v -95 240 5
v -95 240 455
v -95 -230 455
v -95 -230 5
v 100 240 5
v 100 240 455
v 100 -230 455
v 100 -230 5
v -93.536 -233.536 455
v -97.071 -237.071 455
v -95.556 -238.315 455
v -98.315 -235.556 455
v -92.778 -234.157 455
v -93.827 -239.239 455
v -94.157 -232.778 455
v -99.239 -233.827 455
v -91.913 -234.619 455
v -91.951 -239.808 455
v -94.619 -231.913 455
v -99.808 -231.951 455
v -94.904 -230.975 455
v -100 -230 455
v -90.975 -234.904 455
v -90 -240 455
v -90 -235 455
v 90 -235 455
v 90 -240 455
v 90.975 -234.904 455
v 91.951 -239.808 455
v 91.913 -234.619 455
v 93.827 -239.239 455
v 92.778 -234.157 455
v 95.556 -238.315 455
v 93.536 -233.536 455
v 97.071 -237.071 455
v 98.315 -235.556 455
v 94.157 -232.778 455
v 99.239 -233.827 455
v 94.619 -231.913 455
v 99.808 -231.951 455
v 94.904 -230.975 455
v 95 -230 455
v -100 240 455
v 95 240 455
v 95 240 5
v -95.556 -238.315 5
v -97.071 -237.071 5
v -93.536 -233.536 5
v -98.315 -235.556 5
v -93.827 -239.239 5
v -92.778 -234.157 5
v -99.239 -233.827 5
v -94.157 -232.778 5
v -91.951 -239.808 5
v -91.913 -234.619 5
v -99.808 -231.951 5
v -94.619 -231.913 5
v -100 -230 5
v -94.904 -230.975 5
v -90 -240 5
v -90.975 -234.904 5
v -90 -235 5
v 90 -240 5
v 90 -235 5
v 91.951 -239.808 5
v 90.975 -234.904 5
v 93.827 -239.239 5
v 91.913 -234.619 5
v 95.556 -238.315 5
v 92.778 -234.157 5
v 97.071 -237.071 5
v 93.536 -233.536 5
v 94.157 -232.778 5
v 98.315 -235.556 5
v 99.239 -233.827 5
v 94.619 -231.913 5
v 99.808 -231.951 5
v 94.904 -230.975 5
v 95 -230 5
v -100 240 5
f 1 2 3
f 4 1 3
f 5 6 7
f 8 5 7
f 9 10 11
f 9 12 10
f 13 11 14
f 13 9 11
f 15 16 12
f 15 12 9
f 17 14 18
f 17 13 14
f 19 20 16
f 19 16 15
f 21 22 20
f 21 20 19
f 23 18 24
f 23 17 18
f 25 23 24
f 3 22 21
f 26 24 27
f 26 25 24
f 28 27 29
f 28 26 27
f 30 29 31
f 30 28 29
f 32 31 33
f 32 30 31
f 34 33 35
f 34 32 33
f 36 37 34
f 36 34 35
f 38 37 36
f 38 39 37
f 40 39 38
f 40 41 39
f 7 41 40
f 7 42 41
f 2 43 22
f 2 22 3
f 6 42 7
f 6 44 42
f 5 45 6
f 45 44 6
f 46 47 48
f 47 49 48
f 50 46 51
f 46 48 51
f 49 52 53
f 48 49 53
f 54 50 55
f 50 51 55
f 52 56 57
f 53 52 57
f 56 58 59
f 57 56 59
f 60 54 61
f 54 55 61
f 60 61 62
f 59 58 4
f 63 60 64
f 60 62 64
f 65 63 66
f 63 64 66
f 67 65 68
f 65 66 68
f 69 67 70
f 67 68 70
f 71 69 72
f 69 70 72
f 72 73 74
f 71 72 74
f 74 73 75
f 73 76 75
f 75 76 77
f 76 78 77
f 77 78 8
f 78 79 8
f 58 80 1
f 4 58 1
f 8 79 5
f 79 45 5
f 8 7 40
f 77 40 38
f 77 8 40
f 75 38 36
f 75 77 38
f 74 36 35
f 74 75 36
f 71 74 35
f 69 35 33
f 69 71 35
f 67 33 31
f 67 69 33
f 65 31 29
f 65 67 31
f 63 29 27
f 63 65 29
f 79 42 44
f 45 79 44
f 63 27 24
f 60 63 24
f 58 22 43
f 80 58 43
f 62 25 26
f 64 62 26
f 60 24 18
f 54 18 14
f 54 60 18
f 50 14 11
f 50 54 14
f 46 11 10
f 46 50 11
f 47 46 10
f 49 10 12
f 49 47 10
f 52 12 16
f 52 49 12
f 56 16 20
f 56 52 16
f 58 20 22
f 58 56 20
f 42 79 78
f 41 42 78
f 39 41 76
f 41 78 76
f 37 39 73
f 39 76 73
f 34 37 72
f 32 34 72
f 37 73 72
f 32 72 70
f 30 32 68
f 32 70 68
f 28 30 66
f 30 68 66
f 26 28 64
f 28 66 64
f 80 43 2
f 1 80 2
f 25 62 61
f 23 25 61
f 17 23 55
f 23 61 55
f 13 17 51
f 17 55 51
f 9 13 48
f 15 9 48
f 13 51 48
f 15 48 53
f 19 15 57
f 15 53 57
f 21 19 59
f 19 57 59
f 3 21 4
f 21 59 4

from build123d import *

# Parameters (mm, degrees)
SKETCH_1_W            = 200
SKETCH_1_H            = 480
EXTRUDE_1_DEPTH       = 5
FILLET_1_R            = 5
EXTRUDE_START         = 450
EXTRUDE_3_DEPTH       = 450
CUT_EXTRUDE_START     = -5
CUT_EXTRUDE_2_DEPTH   = 5
SHEET_START           = 5
SHEET_METAL_3_DEPTH   = 450
SHEET_METAL_3_2_DEPTH = 450


# Read off the part's stored shape, not the designer's step: 转换实体3
with BuildPart() as part:
    # 草图1 → 凸台-拉伸1 (new body)
    with BuildSketch(Plane.XY):
        Rectangle(SKETCH_1_W, SKETCH_1_H)
    extrude(amount=EXTRUDE_1_DEPTH)

    # 圆角1
    fillet_1_edges = [part.edges().sort_by_distance(p)[0] for p in [
        (100, -240, 2.5),
        (-100, -240, 2.5),
    ]]
    fillet(fillet_1_edges, radius=FILLET_1_R)

    # 草图4 → 凸台-拉伸3 (add)
    with BuildSketch(Plane.XY.offset(5).offset(EXTRUDE_START)):
        with BuildLine():
            Line((-95, 240), (-95, -235))
            Line((-95, -235), (95, -235))
            Line((95, -235), (95, 240))
            Line((95, 240), (100, 240))
            Line((100, 240), (100, -235))
            ThreePointArc((100, -235), (98.535533906, -238.535533906), (95, -240))
            Line((95, -240), (-95, -240))
            ThreePointArc((-95, -240), (-98.535533906, -238.535533906), (-100, -235))
            Line((-100, -235), (-100, 240))
            Line((-100, 240), (-95, 240))
        make_face()
    extrude(amount=-EXTRUDE_3_DEPTH)

    # Sketch 5 → 切除-拉伸2 (cut)
    with BuildSketch(Plane(origin=(0, 0, 0), x_dir=(-1, 0, 0), z_dir=(0, 0, -1)).offset(CUT_EXTRUDE_START)):
        with BuildLine():
            Line((-95, -240), (95, -240))
            ThreePointArc((95, -240), (98.535533906, -238.535533906), (100, -235))
            Line((100, -235), (100, 240))
            Line((100, 240), (-100, 240))
            Line((-100, 240), (-100, -235))
            ThreePointArc((-100, -235), (-98.535533906, -238.535533906), (-95, -240))
        make_face()
    extrude(amount=CUT_EXTRUDE_2_DEPTH, mode=Mode.SUBTRACT)

    # Sheet Metal 3 outline → Sheet Metal 3 (cut)
    with BuildSketch(Plane.XY.offset(SHEET_START)):
        with BuildLine():
            Line((-95, -240), (-90, -240))
            ThreePointArc((-90, -240), (-97.071067812, -237.071067812), (-100, -230))
            Line((-100, -230), (-100, -235))
            ThreePointArc((-100, -235), (-98.535533906, -238.535533906), (-95, -240))
        make_face()
        with BuildLine():
            ThreePointArc((100, -230), (97.071067812, -237.071067812), (90, -240))
            Line((90, -240), (95, -240))
            ThreePointArc((95, -240), (98.535533906, -238.535533906), (100, -235))
            Line((100, -235), (100, -230))
        make_face()
    extrude(amount=SHEET_METAL_3_DEPTH, mode=Mode.SUBTRACT)

    # Sheet Metal 3 2 outline → Sheet Metal 3 2 (add)
    with BuildSketch(Plane.XY.offset(SHEET_START)):
        with BuildLine():
            Line((-95, -235), (-90, -235))
            ThreePointArc((-90, -235), (-93.535533906, -233.535533906), (-95, -230))
            Line((-95, -230), (-95, -235))
        make_face()
        with BuildLine():
            ThreePointArc((95, -230), (93.535533906, -233.535533906), (90, -235))
            Line((90, -235), (95, -235))
            Line((95, -235), (95, -230))
        make_face()
    extrude(amount=SHEET_METAL_3_2_DEPTH)


solid = part.part
